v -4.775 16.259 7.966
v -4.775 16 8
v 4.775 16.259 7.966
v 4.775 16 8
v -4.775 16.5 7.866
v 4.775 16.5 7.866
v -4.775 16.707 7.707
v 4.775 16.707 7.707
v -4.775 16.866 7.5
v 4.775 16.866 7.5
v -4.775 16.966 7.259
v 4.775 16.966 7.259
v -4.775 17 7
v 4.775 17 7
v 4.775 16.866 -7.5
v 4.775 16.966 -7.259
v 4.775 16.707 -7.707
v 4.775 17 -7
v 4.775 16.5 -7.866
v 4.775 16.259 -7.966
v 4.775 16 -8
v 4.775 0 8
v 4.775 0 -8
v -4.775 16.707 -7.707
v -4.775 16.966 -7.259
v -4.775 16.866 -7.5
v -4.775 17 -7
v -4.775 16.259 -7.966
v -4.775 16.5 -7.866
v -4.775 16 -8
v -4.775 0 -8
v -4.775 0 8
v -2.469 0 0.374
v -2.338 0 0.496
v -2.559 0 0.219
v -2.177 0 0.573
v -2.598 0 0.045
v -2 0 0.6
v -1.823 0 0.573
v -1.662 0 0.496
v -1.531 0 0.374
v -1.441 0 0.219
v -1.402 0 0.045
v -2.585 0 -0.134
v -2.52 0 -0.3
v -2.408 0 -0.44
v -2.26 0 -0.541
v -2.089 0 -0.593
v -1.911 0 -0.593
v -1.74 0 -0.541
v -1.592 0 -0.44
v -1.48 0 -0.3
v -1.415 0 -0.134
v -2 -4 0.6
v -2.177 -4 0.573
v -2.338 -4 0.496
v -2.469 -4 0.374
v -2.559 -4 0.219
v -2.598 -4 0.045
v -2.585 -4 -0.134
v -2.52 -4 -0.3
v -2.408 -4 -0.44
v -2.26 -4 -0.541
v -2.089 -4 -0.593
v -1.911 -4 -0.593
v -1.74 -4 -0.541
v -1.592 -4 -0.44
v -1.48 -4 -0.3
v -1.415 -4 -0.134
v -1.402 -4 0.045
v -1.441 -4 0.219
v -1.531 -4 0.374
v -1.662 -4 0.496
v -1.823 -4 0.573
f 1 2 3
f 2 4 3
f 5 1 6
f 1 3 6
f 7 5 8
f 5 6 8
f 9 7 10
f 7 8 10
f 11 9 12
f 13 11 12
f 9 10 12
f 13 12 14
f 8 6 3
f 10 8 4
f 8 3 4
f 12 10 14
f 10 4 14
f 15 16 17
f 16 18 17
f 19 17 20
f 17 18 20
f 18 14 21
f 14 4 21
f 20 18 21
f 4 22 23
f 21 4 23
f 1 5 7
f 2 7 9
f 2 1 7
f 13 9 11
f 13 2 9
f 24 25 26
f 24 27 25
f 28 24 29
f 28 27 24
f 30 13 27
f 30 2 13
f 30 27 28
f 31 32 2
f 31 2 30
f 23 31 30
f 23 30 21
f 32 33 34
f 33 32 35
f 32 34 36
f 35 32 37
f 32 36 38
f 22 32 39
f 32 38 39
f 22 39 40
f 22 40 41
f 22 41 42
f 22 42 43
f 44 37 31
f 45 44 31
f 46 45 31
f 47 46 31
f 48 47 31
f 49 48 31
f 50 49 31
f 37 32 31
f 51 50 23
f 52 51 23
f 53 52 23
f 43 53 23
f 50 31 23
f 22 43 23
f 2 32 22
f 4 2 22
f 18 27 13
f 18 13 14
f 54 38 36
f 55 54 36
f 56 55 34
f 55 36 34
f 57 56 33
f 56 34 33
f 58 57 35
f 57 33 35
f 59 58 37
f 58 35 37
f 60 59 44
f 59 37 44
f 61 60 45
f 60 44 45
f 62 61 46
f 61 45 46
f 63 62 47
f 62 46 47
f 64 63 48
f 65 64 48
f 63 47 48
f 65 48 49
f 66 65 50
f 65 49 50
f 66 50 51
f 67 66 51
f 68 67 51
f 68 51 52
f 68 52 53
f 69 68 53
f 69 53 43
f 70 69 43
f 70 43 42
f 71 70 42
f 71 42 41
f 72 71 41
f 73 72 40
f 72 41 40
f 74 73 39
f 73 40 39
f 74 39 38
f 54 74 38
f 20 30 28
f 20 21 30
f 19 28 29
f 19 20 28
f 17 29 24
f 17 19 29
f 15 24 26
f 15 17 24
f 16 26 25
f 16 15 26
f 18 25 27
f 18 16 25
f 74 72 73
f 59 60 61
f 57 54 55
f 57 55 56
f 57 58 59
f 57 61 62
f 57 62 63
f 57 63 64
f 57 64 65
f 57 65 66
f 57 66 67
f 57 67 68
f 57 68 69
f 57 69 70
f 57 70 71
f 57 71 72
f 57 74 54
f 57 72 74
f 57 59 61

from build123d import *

# Parameters (mm, degrees)
SKETCH_1_W      = 9.55
SKETCH_1_H      = 16
EXTRUDE_1_DEPTH = 17
SKETCH_2_R      = 0.6
EXTRUDE_2_DEPTH = 4
FILLET_1_R      = 1


with BuildPart() as part:
    # 草图1 → 拉伸1 (new body)
    with BuildSketch(Plane(origin=(0, 0, 0), x_dir=(1, 0, 0), z_dir=(0, 1, 0))):
        Rectangle(SKETCH_1_W, SKETCH_1_H)
    extrude(amount=EXTRUDE_1_DEPTH)

    # 草图2 → 拉伸2 (add)
    with BuildSketch(Plane.XZ):
        with Locations(Location((-2, 0, 0), (0, 0, 90))):
            Circle(SKETCH_2_R)
    extrude(amount=EXTRUDE_2_DEPTH)

    # 圆角1
    fillet_1_edges = [part.edges().sort_by_distance(p)[0] for p in [
        (0, 17, -8),
        (0, 17, 8),
    ]]
    fillet(fillet_1_edges, radius=FILLET_1_R)


solid = part.part
